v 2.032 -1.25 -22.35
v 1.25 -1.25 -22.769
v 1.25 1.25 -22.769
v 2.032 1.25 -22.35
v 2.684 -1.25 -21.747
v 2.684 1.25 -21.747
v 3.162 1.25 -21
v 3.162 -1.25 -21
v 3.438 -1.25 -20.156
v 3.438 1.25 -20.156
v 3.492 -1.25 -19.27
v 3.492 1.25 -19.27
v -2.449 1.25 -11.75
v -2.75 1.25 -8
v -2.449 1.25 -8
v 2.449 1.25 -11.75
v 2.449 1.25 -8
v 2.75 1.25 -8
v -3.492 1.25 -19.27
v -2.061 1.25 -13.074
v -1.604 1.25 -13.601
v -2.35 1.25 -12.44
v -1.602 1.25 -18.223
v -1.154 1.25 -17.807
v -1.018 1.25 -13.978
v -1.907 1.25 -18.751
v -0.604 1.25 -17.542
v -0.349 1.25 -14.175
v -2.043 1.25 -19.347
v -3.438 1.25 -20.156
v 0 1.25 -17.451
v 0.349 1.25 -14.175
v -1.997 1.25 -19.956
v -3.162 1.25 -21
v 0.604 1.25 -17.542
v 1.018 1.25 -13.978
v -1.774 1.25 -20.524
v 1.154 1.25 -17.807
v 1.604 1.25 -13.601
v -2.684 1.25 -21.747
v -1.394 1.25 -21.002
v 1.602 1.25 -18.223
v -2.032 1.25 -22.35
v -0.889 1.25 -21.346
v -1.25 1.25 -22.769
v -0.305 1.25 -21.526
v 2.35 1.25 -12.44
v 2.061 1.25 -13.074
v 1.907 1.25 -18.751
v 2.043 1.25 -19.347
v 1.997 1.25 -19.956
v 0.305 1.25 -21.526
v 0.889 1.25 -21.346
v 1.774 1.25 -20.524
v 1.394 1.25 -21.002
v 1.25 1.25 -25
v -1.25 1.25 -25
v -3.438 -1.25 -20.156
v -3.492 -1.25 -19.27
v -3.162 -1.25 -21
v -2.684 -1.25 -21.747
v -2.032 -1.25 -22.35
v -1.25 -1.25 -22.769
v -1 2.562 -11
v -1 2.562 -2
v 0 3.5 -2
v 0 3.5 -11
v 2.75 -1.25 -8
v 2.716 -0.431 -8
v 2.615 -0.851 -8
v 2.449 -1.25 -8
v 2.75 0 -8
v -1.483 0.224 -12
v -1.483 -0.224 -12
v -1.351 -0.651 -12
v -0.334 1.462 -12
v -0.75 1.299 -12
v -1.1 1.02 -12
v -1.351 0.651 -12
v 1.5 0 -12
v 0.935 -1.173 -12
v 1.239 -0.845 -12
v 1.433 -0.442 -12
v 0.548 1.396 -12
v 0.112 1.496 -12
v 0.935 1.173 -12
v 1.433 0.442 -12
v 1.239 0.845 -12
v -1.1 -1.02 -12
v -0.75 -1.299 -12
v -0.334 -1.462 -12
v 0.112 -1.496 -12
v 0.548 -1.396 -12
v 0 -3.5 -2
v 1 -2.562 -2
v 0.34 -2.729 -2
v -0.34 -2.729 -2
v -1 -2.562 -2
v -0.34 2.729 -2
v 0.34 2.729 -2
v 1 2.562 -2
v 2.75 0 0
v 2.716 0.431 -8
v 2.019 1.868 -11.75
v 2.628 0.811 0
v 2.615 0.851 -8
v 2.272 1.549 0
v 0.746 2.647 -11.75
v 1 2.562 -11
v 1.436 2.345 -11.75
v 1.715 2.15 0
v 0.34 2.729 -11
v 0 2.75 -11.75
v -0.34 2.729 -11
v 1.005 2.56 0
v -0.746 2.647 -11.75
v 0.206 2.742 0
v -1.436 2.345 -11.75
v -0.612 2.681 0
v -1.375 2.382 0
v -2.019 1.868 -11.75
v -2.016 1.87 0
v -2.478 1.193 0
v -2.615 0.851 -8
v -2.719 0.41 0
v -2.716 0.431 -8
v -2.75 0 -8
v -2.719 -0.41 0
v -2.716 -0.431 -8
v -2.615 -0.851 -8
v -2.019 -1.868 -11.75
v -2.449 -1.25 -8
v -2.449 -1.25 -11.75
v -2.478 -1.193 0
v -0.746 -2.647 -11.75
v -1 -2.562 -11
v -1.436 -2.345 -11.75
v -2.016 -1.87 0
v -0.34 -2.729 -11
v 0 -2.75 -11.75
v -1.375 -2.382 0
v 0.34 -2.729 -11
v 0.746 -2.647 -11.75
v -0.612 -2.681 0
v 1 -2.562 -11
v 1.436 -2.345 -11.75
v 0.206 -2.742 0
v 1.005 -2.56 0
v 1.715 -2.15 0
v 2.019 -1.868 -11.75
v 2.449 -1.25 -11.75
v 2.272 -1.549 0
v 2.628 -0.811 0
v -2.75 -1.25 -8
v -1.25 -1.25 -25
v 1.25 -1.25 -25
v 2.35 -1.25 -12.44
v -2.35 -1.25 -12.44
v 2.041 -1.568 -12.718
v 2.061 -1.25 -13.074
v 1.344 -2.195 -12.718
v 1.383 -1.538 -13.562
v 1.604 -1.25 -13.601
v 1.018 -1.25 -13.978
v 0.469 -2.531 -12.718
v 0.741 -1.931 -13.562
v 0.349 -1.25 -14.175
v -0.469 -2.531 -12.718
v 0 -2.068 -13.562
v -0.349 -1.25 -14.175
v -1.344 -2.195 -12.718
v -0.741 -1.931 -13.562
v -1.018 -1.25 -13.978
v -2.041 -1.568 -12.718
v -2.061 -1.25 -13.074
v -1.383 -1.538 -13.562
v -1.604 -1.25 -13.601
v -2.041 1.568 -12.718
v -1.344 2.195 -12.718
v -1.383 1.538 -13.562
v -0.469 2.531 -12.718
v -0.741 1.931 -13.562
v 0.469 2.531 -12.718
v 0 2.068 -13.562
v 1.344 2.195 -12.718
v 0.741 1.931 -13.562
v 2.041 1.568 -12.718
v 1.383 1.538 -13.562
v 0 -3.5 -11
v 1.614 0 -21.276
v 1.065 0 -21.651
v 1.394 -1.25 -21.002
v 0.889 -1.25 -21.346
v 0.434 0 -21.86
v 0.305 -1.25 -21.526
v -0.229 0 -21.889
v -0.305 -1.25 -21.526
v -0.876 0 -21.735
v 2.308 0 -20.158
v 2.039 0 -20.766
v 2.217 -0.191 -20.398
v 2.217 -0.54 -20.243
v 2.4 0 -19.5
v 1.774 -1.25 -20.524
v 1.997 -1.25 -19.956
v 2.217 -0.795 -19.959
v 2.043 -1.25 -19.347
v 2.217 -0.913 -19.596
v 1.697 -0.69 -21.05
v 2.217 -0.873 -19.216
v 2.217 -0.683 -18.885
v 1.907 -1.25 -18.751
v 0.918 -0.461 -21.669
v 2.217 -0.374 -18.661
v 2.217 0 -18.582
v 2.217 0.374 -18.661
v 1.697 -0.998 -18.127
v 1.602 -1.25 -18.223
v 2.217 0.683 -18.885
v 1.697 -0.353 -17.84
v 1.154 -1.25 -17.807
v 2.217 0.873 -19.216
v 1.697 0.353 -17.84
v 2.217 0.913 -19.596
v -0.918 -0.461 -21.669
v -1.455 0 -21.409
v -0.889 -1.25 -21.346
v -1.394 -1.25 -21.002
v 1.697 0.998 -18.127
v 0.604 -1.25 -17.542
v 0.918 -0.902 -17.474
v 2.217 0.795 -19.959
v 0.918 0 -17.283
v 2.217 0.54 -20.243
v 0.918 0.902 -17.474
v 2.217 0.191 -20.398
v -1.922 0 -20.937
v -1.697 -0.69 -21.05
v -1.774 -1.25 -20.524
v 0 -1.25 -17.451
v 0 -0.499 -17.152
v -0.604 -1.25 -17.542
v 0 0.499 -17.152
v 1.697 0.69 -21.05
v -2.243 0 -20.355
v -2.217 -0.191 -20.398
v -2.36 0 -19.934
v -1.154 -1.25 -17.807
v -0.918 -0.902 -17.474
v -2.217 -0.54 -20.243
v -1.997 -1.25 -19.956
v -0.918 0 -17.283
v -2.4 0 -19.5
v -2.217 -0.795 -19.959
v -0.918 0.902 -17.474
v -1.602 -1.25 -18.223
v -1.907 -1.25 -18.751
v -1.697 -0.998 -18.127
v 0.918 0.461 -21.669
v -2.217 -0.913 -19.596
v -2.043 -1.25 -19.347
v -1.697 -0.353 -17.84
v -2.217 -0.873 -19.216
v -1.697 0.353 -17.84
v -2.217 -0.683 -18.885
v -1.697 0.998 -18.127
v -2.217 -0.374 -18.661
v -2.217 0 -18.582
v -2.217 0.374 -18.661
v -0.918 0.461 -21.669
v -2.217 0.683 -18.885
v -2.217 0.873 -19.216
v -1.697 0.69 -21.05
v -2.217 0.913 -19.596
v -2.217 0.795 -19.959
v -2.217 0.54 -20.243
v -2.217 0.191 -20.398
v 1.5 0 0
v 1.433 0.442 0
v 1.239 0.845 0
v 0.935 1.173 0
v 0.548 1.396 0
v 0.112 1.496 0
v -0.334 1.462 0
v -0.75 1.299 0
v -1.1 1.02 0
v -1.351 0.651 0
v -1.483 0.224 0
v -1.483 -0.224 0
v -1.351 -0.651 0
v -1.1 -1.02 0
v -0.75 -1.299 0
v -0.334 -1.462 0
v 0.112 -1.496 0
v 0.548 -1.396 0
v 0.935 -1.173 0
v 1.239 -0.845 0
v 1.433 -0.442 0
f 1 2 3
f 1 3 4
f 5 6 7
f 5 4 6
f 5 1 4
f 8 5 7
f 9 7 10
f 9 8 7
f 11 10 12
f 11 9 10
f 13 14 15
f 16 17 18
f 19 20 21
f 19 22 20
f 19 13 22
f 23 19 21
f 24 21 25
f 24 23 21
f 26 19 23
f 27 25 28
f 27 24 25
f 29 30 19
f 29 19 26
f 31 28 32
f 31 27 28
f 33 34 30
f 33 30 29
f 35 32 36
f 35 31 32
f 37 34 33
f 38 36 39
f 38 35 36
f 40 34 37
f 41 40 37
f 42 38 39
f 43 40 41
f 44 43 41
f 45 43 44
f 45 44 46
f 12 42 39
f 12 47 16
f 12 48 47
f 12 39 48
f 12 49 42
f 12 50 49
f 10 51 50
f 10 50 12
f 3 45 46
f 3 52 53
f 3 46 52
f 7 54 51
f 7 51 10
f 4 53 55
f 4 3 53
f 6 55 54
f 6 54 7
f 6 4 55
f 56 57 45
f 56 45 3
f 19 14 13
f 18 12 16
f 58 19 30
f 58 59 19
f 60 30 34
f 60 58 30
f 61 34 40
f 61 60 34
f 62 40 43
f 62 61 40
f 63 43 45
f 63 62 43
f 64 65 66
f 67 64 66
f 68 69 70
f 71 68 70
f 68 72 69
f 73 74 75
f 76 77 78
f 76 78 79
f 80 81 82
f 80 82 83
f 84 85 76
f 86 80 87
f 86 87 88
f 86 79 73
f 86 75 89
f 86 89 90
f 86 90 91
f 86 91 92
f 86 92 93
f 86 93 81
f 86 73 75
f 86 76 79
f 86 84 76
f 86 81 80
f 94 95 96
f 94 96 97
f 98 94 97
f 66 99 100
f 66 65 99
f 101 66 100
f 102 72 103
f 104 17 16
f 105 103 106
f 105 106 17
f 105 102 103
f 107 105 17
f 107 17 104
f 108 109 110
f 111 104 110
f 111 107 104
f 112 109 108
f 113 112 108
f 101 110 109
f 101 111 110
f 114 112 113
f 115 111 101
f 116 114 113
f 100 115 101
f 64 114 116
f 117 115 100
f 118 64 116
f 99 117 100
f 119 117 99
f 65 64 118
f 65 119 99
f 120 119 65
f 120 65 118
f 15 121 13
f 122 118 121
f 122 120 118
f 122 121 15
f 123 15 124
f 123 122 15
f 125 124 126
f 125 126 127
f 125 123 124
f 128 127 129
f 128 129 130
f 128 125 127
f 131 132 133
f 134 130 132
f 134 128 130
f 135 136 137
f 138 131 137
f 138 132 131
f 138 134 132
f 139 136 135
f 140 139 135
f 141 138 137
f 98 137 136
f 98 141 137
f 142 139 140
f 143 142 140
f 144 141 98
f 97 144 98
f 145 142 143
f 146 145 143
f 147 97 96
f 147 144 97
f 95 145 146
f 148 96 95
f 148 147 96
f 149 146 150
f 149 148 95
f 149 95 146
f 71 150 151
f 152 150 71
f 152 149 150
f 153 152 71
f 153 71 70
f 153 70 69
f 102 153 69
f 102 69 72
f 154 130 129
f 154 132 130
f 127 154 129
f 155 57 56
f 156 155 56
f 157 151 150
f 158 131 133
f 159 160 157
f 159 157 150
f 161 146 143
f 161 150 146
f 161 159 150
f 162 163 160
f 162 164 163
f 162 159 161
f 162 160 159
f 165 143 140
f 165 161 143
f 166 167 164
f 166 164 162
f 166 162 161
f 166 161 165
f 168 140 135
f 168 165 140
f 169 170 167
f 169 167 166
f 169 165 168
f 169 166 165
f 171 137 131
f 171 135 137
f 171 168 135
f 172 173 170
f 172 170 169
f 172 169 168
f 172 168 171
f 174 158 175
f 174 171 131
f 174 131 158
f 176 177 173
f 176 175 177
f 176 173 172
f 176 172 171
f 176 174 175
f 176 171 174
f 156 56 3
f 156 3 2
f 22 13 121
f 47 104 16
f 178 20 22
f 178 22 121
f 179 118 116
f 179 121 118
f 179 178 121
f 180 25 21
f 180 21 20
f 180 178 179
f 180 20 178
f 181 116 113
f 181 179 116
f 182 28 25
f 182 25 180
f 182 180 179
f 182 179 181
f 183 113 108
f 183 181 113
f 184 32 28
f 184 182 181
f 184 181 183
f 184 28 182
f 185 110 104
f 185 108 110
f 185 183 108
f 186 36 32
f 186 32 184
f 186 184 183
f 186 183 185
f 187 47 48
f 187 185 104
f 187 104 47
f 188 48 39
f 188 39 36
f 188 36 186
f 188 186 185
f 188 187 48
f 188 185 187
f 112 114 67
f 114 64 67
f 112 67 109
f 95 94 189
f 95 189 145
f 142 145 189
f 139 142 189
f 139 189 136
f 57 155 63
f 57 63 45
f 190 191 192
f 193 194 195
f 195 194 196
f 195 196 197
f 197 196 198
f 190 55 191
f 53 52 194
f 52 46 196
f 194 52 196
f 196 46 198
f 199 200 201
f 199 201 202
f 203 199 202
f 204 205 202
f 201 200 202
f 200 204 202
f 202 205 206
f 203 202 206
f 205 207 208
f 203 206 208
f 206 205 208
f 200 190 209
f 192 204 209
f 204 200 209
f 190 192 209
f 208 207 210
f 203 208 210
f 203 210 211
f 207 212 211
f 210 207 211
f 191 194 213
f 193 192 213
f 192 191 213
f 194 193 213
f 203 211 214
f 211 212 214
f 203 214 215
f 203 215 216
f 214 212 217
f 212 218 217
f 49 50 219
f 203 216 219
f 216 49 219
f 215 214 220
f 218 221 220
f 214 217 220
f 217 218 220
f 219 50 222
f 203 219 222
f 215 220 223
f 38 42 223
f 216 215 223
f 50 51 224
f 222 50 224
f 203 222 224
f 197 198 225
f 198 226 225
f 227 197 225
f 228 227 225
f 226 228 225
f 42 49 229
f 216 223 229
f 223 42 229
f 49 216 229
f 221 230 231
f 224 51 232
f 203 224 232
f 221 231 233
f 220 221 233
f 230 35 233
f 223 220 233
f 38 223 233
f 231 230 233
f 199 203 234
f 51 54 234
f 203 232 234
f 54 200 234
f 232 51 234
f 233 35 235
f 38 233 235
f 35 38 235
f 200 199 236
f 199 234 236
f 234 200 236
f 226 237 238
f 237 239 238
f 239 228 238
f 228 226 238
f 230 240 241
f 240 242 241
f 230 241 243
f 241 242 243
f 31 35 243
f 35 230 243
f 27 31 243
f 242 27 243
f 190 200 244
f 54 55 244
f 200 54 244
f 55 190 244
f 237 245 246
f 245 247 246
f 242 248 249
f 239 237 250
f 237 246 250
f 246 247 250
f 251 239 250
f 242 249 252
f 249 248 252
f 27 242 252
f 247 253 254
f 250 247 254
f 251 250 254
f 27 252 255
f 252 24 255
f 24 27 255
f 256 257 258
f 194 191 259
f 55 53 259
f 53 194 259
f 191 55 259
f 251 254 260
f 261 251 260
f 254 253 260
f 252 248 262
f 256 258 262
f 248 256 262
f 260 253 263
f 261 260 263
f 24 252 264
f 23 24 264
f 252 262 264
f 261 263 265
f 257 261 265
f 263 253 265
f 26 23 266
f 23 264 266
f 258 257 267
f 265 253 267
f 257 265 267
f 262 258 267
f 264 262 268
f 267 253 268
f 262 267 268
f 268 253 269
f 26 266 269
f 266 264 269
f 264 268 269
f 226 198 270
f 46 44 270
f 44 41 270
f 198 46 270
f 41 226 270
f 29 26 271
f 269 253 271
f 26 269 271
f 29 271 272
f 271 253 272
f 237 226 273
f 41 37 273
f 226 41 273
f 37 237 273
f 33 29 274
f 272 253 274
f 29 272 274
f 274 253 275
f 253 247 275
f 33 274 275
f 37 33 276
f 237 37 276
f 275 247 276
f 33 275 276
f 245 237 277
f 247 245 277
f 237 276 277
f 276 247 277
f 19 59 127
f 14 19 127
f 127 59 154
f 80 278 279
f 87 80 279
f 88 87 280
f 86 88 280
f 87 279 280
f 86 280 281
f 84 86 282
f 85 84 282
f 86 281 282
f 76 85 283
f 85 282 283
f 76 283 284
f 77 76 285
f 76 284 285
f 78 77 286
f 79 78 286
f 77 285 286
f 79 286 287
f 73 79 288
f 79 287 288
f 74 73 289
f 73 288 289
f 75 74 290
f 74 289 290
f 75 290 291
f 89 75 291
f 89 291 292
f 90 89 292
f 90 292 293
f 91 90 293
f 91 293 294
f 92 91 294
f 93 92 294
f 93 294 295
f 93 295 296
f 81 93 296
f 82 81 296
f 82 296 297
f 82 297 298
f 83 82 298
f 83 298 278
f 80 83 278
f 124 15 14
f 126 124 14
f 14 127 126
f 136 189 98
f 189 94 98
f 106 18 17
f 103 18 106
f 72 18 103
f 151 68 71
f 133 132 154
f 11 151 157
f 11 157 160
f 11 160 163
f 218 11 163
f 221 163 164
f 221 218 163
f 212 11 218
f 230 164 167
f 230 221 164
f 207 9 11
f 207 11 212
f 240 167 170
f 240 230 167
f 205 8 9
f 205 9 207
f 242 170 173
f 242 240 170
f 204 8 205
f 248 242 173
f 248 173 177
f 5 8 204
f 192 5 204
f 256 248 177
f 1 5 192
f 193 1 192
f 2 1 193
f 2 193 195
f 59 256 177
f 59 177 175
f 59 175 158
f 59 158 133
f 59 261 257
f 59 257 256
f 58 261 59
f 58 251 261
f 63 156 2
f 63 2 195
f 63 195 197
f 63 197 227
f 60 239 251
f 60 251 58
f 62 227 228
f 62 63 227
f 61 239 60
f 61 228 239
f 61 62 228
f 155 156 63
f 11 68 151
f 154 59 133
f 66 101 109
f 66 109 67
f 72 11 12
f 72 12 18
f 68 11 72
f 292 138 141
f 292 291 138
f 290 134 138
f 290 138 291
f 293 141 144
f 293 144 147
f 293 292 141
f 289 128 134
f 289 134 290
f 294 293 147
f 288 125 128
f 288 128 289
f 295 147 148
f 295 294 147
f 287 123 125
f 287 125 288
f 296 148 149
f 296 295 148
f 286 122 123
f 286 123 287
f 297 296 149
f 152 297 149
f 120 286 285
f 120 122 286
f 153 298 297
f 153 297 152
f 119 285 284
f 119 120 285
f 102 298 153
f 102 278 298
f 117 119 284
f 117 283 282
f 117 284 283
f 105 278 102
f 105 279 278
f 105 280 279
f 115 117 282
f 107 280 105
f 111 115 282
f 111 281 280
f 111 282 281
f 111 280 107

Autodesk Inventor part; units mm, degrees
ref_plane "YZ Plane" through (0, 0, 0) normal (1, 0, 0) x (0, 1, 0)
sketch "Sketch2" plane through (0, 0, 0) normal (0, 0, 1) x (1, 0, 0)
  circle A0 centre (0, 0) radius 2.75
  dimension "d0" = 5.5
extrude "Extrusion1" add sketch "Sketch2" against normal blind 14.5
fillet "Fillet1" radius 2.75 1 edges at (-2.75, 0, -14.5)
sketch "Sketch3" plane through (0, 0, 0) normal (0, 1, 0) x (-1, 0, 0)
  line L0 (2.75, 0) -> (-2.75, 0) construction
  line L1 (-2.75, -11.75) -> (2.75, -11.75) construction
  arc A0 (-3.4924, -19.2699) -> (3.4924, -19.2699) centre (0, -19.5) ccw
  line L2 (3.4924, -19.2699) -> (2.75, -8)
  line L3 (-3.4924, -19.2699) -> (-2.75, -8)
  line L4 (0, -27.6) -> (0, 4.6) construction
  line L5 (2.75, 0) -> (2.75, -11.75) construction
  line L6 (-2.75, 0) -> (-2.75, -11.75) construction
  line L7 (-2.75, -8) -> (2.75, -8)
  point P0 (0, 0)
  dimension "d4" = 7
  dimension "d5" = 8
  dimension "d6" = 19.5
  dimension "d7" = 8
extrude "Extrusion2" add sketch "Sketch3" along normal mid plane 2.5
sketch "Sketch4" plane through (0, 0, 0) normal (0, 1, 0) x (-1, 0, 0)
  arc A0 (-3.4924, -19.2699) -> (3.4924, -19.2699) centre (0, -19.5) ccw construction
  arc A1 (-2.4, -19.5) -> (2.4, -19.5) centre (0, -19.5) ccw
  line L0 (2.4, -19.5) -> (-2.4, -19.5)
  point P0 (0, 0)
  dimension "d10" = 4.8
revolve "Revolution1" cut sketch "Sketch4" angle 360 about axis through (-2.4, 0, -19.5) along (1, 0, 0)
sketch "Sketch5" plane through (0, 0, 0) normal (0, 0, 1) x (1, 0, 0)
  circle A0 centre (0, 0) radius 1.5
  dimension "d12" = 3
extrude "Extrusion3" cut sketch "Sketch5" against normal blind 12
thread "Thread1" size "M3x0.5" designation "M3" class "6H" standard "ISO Metric profile" length 110
ref_plane "Work Plane1" through (0, 0, -23) normal (0, 0, 1) x (1, 0, 0)
sketch "Sketch6" plane through (0, 0, -23) normal (0, 0, 1) x (1, 0, 0)
  line L0 (-4.9, 0) -> (4.9, 0) construction
  line L1 (0, -3.85) -> (0, 3.85) construction
  line L2 (1.25, 1.25) -> (-1.25, 1.25)
  line L3 (-1.25, 1.25) -> (-1.25, -1.25)
  line L4 (-1.25, -1.25) -> (1.25, -1.25)
  line L5 (1.25, -1.25) -> (1.25, 1.25)
  point P0 (0, 0)
  dimension "d17" = 2.5
  dimension "d18" = 2.5
extrude "Extrusion4" add sketch "Sketch6" against normal blind 2
sketch "Sketch7" plane through (0, 0, -23) normal (0, 0, 1) x (1, 0, 0)
  line L0 (-1.25, -1.25) -> (-1.25, 1.25) construction
  line L1 (-1.25, 1.25) -> (1.25, 1.25) construction
  line L2 (1.25, 1.25) -> (1.25, -1.25) construction
  line L3 (1.25, -1.25) -> (-1.25, -1.25) construction
  line L4 (-1.25, 1.25) -> (1.25, 1.25)
  line L5 (1.25, 1.25) -> (1.25, -1.25)
  line L6 (1.25, -1.25) -> (-1.25, -1.25)
  line L7 (-1.25, -1.25) -> (-1.25, 1.25)
  point P0 (0, 0)
extrude "Extrusion5" add sketch "Sketch7" along normal up to surface
ref_plane "Work Plane2" through (0, 0, -2) normal (0, 0, 1) x (1, 0, 0)
sketch "Sketch8" plane through (0, 0, -2) normal (0, 0, 1) x (1, 0, 0)
  arc A0 (2.4495, 1.25) -> (-2.4495, 1.25) centre (0, 0) ccw construction
  circle A1 centre (0, 0) radius 2.75
  line L0 (0, -3.85) -> (0, 3.85) construction
  line L1 (-4.9, 0) -> (4.9, 0) construction
  line L2 (-1, 2.5617) -> (0, 3.5)
  line L3 (1, 2.5617) -> (0, 3.5)
  dimension "d24" = 3.5
  dimension "d25" = 2
extrude "Extrusion6" add sketch "Sketch8" against normal blind 9 contours A1 L2 L3
mirror "Mirror1" about plane through (0, 0, 0) normal (0, 1, 0) of "Extrusion6"
properties part number "Rotule_M3" material "POM"
